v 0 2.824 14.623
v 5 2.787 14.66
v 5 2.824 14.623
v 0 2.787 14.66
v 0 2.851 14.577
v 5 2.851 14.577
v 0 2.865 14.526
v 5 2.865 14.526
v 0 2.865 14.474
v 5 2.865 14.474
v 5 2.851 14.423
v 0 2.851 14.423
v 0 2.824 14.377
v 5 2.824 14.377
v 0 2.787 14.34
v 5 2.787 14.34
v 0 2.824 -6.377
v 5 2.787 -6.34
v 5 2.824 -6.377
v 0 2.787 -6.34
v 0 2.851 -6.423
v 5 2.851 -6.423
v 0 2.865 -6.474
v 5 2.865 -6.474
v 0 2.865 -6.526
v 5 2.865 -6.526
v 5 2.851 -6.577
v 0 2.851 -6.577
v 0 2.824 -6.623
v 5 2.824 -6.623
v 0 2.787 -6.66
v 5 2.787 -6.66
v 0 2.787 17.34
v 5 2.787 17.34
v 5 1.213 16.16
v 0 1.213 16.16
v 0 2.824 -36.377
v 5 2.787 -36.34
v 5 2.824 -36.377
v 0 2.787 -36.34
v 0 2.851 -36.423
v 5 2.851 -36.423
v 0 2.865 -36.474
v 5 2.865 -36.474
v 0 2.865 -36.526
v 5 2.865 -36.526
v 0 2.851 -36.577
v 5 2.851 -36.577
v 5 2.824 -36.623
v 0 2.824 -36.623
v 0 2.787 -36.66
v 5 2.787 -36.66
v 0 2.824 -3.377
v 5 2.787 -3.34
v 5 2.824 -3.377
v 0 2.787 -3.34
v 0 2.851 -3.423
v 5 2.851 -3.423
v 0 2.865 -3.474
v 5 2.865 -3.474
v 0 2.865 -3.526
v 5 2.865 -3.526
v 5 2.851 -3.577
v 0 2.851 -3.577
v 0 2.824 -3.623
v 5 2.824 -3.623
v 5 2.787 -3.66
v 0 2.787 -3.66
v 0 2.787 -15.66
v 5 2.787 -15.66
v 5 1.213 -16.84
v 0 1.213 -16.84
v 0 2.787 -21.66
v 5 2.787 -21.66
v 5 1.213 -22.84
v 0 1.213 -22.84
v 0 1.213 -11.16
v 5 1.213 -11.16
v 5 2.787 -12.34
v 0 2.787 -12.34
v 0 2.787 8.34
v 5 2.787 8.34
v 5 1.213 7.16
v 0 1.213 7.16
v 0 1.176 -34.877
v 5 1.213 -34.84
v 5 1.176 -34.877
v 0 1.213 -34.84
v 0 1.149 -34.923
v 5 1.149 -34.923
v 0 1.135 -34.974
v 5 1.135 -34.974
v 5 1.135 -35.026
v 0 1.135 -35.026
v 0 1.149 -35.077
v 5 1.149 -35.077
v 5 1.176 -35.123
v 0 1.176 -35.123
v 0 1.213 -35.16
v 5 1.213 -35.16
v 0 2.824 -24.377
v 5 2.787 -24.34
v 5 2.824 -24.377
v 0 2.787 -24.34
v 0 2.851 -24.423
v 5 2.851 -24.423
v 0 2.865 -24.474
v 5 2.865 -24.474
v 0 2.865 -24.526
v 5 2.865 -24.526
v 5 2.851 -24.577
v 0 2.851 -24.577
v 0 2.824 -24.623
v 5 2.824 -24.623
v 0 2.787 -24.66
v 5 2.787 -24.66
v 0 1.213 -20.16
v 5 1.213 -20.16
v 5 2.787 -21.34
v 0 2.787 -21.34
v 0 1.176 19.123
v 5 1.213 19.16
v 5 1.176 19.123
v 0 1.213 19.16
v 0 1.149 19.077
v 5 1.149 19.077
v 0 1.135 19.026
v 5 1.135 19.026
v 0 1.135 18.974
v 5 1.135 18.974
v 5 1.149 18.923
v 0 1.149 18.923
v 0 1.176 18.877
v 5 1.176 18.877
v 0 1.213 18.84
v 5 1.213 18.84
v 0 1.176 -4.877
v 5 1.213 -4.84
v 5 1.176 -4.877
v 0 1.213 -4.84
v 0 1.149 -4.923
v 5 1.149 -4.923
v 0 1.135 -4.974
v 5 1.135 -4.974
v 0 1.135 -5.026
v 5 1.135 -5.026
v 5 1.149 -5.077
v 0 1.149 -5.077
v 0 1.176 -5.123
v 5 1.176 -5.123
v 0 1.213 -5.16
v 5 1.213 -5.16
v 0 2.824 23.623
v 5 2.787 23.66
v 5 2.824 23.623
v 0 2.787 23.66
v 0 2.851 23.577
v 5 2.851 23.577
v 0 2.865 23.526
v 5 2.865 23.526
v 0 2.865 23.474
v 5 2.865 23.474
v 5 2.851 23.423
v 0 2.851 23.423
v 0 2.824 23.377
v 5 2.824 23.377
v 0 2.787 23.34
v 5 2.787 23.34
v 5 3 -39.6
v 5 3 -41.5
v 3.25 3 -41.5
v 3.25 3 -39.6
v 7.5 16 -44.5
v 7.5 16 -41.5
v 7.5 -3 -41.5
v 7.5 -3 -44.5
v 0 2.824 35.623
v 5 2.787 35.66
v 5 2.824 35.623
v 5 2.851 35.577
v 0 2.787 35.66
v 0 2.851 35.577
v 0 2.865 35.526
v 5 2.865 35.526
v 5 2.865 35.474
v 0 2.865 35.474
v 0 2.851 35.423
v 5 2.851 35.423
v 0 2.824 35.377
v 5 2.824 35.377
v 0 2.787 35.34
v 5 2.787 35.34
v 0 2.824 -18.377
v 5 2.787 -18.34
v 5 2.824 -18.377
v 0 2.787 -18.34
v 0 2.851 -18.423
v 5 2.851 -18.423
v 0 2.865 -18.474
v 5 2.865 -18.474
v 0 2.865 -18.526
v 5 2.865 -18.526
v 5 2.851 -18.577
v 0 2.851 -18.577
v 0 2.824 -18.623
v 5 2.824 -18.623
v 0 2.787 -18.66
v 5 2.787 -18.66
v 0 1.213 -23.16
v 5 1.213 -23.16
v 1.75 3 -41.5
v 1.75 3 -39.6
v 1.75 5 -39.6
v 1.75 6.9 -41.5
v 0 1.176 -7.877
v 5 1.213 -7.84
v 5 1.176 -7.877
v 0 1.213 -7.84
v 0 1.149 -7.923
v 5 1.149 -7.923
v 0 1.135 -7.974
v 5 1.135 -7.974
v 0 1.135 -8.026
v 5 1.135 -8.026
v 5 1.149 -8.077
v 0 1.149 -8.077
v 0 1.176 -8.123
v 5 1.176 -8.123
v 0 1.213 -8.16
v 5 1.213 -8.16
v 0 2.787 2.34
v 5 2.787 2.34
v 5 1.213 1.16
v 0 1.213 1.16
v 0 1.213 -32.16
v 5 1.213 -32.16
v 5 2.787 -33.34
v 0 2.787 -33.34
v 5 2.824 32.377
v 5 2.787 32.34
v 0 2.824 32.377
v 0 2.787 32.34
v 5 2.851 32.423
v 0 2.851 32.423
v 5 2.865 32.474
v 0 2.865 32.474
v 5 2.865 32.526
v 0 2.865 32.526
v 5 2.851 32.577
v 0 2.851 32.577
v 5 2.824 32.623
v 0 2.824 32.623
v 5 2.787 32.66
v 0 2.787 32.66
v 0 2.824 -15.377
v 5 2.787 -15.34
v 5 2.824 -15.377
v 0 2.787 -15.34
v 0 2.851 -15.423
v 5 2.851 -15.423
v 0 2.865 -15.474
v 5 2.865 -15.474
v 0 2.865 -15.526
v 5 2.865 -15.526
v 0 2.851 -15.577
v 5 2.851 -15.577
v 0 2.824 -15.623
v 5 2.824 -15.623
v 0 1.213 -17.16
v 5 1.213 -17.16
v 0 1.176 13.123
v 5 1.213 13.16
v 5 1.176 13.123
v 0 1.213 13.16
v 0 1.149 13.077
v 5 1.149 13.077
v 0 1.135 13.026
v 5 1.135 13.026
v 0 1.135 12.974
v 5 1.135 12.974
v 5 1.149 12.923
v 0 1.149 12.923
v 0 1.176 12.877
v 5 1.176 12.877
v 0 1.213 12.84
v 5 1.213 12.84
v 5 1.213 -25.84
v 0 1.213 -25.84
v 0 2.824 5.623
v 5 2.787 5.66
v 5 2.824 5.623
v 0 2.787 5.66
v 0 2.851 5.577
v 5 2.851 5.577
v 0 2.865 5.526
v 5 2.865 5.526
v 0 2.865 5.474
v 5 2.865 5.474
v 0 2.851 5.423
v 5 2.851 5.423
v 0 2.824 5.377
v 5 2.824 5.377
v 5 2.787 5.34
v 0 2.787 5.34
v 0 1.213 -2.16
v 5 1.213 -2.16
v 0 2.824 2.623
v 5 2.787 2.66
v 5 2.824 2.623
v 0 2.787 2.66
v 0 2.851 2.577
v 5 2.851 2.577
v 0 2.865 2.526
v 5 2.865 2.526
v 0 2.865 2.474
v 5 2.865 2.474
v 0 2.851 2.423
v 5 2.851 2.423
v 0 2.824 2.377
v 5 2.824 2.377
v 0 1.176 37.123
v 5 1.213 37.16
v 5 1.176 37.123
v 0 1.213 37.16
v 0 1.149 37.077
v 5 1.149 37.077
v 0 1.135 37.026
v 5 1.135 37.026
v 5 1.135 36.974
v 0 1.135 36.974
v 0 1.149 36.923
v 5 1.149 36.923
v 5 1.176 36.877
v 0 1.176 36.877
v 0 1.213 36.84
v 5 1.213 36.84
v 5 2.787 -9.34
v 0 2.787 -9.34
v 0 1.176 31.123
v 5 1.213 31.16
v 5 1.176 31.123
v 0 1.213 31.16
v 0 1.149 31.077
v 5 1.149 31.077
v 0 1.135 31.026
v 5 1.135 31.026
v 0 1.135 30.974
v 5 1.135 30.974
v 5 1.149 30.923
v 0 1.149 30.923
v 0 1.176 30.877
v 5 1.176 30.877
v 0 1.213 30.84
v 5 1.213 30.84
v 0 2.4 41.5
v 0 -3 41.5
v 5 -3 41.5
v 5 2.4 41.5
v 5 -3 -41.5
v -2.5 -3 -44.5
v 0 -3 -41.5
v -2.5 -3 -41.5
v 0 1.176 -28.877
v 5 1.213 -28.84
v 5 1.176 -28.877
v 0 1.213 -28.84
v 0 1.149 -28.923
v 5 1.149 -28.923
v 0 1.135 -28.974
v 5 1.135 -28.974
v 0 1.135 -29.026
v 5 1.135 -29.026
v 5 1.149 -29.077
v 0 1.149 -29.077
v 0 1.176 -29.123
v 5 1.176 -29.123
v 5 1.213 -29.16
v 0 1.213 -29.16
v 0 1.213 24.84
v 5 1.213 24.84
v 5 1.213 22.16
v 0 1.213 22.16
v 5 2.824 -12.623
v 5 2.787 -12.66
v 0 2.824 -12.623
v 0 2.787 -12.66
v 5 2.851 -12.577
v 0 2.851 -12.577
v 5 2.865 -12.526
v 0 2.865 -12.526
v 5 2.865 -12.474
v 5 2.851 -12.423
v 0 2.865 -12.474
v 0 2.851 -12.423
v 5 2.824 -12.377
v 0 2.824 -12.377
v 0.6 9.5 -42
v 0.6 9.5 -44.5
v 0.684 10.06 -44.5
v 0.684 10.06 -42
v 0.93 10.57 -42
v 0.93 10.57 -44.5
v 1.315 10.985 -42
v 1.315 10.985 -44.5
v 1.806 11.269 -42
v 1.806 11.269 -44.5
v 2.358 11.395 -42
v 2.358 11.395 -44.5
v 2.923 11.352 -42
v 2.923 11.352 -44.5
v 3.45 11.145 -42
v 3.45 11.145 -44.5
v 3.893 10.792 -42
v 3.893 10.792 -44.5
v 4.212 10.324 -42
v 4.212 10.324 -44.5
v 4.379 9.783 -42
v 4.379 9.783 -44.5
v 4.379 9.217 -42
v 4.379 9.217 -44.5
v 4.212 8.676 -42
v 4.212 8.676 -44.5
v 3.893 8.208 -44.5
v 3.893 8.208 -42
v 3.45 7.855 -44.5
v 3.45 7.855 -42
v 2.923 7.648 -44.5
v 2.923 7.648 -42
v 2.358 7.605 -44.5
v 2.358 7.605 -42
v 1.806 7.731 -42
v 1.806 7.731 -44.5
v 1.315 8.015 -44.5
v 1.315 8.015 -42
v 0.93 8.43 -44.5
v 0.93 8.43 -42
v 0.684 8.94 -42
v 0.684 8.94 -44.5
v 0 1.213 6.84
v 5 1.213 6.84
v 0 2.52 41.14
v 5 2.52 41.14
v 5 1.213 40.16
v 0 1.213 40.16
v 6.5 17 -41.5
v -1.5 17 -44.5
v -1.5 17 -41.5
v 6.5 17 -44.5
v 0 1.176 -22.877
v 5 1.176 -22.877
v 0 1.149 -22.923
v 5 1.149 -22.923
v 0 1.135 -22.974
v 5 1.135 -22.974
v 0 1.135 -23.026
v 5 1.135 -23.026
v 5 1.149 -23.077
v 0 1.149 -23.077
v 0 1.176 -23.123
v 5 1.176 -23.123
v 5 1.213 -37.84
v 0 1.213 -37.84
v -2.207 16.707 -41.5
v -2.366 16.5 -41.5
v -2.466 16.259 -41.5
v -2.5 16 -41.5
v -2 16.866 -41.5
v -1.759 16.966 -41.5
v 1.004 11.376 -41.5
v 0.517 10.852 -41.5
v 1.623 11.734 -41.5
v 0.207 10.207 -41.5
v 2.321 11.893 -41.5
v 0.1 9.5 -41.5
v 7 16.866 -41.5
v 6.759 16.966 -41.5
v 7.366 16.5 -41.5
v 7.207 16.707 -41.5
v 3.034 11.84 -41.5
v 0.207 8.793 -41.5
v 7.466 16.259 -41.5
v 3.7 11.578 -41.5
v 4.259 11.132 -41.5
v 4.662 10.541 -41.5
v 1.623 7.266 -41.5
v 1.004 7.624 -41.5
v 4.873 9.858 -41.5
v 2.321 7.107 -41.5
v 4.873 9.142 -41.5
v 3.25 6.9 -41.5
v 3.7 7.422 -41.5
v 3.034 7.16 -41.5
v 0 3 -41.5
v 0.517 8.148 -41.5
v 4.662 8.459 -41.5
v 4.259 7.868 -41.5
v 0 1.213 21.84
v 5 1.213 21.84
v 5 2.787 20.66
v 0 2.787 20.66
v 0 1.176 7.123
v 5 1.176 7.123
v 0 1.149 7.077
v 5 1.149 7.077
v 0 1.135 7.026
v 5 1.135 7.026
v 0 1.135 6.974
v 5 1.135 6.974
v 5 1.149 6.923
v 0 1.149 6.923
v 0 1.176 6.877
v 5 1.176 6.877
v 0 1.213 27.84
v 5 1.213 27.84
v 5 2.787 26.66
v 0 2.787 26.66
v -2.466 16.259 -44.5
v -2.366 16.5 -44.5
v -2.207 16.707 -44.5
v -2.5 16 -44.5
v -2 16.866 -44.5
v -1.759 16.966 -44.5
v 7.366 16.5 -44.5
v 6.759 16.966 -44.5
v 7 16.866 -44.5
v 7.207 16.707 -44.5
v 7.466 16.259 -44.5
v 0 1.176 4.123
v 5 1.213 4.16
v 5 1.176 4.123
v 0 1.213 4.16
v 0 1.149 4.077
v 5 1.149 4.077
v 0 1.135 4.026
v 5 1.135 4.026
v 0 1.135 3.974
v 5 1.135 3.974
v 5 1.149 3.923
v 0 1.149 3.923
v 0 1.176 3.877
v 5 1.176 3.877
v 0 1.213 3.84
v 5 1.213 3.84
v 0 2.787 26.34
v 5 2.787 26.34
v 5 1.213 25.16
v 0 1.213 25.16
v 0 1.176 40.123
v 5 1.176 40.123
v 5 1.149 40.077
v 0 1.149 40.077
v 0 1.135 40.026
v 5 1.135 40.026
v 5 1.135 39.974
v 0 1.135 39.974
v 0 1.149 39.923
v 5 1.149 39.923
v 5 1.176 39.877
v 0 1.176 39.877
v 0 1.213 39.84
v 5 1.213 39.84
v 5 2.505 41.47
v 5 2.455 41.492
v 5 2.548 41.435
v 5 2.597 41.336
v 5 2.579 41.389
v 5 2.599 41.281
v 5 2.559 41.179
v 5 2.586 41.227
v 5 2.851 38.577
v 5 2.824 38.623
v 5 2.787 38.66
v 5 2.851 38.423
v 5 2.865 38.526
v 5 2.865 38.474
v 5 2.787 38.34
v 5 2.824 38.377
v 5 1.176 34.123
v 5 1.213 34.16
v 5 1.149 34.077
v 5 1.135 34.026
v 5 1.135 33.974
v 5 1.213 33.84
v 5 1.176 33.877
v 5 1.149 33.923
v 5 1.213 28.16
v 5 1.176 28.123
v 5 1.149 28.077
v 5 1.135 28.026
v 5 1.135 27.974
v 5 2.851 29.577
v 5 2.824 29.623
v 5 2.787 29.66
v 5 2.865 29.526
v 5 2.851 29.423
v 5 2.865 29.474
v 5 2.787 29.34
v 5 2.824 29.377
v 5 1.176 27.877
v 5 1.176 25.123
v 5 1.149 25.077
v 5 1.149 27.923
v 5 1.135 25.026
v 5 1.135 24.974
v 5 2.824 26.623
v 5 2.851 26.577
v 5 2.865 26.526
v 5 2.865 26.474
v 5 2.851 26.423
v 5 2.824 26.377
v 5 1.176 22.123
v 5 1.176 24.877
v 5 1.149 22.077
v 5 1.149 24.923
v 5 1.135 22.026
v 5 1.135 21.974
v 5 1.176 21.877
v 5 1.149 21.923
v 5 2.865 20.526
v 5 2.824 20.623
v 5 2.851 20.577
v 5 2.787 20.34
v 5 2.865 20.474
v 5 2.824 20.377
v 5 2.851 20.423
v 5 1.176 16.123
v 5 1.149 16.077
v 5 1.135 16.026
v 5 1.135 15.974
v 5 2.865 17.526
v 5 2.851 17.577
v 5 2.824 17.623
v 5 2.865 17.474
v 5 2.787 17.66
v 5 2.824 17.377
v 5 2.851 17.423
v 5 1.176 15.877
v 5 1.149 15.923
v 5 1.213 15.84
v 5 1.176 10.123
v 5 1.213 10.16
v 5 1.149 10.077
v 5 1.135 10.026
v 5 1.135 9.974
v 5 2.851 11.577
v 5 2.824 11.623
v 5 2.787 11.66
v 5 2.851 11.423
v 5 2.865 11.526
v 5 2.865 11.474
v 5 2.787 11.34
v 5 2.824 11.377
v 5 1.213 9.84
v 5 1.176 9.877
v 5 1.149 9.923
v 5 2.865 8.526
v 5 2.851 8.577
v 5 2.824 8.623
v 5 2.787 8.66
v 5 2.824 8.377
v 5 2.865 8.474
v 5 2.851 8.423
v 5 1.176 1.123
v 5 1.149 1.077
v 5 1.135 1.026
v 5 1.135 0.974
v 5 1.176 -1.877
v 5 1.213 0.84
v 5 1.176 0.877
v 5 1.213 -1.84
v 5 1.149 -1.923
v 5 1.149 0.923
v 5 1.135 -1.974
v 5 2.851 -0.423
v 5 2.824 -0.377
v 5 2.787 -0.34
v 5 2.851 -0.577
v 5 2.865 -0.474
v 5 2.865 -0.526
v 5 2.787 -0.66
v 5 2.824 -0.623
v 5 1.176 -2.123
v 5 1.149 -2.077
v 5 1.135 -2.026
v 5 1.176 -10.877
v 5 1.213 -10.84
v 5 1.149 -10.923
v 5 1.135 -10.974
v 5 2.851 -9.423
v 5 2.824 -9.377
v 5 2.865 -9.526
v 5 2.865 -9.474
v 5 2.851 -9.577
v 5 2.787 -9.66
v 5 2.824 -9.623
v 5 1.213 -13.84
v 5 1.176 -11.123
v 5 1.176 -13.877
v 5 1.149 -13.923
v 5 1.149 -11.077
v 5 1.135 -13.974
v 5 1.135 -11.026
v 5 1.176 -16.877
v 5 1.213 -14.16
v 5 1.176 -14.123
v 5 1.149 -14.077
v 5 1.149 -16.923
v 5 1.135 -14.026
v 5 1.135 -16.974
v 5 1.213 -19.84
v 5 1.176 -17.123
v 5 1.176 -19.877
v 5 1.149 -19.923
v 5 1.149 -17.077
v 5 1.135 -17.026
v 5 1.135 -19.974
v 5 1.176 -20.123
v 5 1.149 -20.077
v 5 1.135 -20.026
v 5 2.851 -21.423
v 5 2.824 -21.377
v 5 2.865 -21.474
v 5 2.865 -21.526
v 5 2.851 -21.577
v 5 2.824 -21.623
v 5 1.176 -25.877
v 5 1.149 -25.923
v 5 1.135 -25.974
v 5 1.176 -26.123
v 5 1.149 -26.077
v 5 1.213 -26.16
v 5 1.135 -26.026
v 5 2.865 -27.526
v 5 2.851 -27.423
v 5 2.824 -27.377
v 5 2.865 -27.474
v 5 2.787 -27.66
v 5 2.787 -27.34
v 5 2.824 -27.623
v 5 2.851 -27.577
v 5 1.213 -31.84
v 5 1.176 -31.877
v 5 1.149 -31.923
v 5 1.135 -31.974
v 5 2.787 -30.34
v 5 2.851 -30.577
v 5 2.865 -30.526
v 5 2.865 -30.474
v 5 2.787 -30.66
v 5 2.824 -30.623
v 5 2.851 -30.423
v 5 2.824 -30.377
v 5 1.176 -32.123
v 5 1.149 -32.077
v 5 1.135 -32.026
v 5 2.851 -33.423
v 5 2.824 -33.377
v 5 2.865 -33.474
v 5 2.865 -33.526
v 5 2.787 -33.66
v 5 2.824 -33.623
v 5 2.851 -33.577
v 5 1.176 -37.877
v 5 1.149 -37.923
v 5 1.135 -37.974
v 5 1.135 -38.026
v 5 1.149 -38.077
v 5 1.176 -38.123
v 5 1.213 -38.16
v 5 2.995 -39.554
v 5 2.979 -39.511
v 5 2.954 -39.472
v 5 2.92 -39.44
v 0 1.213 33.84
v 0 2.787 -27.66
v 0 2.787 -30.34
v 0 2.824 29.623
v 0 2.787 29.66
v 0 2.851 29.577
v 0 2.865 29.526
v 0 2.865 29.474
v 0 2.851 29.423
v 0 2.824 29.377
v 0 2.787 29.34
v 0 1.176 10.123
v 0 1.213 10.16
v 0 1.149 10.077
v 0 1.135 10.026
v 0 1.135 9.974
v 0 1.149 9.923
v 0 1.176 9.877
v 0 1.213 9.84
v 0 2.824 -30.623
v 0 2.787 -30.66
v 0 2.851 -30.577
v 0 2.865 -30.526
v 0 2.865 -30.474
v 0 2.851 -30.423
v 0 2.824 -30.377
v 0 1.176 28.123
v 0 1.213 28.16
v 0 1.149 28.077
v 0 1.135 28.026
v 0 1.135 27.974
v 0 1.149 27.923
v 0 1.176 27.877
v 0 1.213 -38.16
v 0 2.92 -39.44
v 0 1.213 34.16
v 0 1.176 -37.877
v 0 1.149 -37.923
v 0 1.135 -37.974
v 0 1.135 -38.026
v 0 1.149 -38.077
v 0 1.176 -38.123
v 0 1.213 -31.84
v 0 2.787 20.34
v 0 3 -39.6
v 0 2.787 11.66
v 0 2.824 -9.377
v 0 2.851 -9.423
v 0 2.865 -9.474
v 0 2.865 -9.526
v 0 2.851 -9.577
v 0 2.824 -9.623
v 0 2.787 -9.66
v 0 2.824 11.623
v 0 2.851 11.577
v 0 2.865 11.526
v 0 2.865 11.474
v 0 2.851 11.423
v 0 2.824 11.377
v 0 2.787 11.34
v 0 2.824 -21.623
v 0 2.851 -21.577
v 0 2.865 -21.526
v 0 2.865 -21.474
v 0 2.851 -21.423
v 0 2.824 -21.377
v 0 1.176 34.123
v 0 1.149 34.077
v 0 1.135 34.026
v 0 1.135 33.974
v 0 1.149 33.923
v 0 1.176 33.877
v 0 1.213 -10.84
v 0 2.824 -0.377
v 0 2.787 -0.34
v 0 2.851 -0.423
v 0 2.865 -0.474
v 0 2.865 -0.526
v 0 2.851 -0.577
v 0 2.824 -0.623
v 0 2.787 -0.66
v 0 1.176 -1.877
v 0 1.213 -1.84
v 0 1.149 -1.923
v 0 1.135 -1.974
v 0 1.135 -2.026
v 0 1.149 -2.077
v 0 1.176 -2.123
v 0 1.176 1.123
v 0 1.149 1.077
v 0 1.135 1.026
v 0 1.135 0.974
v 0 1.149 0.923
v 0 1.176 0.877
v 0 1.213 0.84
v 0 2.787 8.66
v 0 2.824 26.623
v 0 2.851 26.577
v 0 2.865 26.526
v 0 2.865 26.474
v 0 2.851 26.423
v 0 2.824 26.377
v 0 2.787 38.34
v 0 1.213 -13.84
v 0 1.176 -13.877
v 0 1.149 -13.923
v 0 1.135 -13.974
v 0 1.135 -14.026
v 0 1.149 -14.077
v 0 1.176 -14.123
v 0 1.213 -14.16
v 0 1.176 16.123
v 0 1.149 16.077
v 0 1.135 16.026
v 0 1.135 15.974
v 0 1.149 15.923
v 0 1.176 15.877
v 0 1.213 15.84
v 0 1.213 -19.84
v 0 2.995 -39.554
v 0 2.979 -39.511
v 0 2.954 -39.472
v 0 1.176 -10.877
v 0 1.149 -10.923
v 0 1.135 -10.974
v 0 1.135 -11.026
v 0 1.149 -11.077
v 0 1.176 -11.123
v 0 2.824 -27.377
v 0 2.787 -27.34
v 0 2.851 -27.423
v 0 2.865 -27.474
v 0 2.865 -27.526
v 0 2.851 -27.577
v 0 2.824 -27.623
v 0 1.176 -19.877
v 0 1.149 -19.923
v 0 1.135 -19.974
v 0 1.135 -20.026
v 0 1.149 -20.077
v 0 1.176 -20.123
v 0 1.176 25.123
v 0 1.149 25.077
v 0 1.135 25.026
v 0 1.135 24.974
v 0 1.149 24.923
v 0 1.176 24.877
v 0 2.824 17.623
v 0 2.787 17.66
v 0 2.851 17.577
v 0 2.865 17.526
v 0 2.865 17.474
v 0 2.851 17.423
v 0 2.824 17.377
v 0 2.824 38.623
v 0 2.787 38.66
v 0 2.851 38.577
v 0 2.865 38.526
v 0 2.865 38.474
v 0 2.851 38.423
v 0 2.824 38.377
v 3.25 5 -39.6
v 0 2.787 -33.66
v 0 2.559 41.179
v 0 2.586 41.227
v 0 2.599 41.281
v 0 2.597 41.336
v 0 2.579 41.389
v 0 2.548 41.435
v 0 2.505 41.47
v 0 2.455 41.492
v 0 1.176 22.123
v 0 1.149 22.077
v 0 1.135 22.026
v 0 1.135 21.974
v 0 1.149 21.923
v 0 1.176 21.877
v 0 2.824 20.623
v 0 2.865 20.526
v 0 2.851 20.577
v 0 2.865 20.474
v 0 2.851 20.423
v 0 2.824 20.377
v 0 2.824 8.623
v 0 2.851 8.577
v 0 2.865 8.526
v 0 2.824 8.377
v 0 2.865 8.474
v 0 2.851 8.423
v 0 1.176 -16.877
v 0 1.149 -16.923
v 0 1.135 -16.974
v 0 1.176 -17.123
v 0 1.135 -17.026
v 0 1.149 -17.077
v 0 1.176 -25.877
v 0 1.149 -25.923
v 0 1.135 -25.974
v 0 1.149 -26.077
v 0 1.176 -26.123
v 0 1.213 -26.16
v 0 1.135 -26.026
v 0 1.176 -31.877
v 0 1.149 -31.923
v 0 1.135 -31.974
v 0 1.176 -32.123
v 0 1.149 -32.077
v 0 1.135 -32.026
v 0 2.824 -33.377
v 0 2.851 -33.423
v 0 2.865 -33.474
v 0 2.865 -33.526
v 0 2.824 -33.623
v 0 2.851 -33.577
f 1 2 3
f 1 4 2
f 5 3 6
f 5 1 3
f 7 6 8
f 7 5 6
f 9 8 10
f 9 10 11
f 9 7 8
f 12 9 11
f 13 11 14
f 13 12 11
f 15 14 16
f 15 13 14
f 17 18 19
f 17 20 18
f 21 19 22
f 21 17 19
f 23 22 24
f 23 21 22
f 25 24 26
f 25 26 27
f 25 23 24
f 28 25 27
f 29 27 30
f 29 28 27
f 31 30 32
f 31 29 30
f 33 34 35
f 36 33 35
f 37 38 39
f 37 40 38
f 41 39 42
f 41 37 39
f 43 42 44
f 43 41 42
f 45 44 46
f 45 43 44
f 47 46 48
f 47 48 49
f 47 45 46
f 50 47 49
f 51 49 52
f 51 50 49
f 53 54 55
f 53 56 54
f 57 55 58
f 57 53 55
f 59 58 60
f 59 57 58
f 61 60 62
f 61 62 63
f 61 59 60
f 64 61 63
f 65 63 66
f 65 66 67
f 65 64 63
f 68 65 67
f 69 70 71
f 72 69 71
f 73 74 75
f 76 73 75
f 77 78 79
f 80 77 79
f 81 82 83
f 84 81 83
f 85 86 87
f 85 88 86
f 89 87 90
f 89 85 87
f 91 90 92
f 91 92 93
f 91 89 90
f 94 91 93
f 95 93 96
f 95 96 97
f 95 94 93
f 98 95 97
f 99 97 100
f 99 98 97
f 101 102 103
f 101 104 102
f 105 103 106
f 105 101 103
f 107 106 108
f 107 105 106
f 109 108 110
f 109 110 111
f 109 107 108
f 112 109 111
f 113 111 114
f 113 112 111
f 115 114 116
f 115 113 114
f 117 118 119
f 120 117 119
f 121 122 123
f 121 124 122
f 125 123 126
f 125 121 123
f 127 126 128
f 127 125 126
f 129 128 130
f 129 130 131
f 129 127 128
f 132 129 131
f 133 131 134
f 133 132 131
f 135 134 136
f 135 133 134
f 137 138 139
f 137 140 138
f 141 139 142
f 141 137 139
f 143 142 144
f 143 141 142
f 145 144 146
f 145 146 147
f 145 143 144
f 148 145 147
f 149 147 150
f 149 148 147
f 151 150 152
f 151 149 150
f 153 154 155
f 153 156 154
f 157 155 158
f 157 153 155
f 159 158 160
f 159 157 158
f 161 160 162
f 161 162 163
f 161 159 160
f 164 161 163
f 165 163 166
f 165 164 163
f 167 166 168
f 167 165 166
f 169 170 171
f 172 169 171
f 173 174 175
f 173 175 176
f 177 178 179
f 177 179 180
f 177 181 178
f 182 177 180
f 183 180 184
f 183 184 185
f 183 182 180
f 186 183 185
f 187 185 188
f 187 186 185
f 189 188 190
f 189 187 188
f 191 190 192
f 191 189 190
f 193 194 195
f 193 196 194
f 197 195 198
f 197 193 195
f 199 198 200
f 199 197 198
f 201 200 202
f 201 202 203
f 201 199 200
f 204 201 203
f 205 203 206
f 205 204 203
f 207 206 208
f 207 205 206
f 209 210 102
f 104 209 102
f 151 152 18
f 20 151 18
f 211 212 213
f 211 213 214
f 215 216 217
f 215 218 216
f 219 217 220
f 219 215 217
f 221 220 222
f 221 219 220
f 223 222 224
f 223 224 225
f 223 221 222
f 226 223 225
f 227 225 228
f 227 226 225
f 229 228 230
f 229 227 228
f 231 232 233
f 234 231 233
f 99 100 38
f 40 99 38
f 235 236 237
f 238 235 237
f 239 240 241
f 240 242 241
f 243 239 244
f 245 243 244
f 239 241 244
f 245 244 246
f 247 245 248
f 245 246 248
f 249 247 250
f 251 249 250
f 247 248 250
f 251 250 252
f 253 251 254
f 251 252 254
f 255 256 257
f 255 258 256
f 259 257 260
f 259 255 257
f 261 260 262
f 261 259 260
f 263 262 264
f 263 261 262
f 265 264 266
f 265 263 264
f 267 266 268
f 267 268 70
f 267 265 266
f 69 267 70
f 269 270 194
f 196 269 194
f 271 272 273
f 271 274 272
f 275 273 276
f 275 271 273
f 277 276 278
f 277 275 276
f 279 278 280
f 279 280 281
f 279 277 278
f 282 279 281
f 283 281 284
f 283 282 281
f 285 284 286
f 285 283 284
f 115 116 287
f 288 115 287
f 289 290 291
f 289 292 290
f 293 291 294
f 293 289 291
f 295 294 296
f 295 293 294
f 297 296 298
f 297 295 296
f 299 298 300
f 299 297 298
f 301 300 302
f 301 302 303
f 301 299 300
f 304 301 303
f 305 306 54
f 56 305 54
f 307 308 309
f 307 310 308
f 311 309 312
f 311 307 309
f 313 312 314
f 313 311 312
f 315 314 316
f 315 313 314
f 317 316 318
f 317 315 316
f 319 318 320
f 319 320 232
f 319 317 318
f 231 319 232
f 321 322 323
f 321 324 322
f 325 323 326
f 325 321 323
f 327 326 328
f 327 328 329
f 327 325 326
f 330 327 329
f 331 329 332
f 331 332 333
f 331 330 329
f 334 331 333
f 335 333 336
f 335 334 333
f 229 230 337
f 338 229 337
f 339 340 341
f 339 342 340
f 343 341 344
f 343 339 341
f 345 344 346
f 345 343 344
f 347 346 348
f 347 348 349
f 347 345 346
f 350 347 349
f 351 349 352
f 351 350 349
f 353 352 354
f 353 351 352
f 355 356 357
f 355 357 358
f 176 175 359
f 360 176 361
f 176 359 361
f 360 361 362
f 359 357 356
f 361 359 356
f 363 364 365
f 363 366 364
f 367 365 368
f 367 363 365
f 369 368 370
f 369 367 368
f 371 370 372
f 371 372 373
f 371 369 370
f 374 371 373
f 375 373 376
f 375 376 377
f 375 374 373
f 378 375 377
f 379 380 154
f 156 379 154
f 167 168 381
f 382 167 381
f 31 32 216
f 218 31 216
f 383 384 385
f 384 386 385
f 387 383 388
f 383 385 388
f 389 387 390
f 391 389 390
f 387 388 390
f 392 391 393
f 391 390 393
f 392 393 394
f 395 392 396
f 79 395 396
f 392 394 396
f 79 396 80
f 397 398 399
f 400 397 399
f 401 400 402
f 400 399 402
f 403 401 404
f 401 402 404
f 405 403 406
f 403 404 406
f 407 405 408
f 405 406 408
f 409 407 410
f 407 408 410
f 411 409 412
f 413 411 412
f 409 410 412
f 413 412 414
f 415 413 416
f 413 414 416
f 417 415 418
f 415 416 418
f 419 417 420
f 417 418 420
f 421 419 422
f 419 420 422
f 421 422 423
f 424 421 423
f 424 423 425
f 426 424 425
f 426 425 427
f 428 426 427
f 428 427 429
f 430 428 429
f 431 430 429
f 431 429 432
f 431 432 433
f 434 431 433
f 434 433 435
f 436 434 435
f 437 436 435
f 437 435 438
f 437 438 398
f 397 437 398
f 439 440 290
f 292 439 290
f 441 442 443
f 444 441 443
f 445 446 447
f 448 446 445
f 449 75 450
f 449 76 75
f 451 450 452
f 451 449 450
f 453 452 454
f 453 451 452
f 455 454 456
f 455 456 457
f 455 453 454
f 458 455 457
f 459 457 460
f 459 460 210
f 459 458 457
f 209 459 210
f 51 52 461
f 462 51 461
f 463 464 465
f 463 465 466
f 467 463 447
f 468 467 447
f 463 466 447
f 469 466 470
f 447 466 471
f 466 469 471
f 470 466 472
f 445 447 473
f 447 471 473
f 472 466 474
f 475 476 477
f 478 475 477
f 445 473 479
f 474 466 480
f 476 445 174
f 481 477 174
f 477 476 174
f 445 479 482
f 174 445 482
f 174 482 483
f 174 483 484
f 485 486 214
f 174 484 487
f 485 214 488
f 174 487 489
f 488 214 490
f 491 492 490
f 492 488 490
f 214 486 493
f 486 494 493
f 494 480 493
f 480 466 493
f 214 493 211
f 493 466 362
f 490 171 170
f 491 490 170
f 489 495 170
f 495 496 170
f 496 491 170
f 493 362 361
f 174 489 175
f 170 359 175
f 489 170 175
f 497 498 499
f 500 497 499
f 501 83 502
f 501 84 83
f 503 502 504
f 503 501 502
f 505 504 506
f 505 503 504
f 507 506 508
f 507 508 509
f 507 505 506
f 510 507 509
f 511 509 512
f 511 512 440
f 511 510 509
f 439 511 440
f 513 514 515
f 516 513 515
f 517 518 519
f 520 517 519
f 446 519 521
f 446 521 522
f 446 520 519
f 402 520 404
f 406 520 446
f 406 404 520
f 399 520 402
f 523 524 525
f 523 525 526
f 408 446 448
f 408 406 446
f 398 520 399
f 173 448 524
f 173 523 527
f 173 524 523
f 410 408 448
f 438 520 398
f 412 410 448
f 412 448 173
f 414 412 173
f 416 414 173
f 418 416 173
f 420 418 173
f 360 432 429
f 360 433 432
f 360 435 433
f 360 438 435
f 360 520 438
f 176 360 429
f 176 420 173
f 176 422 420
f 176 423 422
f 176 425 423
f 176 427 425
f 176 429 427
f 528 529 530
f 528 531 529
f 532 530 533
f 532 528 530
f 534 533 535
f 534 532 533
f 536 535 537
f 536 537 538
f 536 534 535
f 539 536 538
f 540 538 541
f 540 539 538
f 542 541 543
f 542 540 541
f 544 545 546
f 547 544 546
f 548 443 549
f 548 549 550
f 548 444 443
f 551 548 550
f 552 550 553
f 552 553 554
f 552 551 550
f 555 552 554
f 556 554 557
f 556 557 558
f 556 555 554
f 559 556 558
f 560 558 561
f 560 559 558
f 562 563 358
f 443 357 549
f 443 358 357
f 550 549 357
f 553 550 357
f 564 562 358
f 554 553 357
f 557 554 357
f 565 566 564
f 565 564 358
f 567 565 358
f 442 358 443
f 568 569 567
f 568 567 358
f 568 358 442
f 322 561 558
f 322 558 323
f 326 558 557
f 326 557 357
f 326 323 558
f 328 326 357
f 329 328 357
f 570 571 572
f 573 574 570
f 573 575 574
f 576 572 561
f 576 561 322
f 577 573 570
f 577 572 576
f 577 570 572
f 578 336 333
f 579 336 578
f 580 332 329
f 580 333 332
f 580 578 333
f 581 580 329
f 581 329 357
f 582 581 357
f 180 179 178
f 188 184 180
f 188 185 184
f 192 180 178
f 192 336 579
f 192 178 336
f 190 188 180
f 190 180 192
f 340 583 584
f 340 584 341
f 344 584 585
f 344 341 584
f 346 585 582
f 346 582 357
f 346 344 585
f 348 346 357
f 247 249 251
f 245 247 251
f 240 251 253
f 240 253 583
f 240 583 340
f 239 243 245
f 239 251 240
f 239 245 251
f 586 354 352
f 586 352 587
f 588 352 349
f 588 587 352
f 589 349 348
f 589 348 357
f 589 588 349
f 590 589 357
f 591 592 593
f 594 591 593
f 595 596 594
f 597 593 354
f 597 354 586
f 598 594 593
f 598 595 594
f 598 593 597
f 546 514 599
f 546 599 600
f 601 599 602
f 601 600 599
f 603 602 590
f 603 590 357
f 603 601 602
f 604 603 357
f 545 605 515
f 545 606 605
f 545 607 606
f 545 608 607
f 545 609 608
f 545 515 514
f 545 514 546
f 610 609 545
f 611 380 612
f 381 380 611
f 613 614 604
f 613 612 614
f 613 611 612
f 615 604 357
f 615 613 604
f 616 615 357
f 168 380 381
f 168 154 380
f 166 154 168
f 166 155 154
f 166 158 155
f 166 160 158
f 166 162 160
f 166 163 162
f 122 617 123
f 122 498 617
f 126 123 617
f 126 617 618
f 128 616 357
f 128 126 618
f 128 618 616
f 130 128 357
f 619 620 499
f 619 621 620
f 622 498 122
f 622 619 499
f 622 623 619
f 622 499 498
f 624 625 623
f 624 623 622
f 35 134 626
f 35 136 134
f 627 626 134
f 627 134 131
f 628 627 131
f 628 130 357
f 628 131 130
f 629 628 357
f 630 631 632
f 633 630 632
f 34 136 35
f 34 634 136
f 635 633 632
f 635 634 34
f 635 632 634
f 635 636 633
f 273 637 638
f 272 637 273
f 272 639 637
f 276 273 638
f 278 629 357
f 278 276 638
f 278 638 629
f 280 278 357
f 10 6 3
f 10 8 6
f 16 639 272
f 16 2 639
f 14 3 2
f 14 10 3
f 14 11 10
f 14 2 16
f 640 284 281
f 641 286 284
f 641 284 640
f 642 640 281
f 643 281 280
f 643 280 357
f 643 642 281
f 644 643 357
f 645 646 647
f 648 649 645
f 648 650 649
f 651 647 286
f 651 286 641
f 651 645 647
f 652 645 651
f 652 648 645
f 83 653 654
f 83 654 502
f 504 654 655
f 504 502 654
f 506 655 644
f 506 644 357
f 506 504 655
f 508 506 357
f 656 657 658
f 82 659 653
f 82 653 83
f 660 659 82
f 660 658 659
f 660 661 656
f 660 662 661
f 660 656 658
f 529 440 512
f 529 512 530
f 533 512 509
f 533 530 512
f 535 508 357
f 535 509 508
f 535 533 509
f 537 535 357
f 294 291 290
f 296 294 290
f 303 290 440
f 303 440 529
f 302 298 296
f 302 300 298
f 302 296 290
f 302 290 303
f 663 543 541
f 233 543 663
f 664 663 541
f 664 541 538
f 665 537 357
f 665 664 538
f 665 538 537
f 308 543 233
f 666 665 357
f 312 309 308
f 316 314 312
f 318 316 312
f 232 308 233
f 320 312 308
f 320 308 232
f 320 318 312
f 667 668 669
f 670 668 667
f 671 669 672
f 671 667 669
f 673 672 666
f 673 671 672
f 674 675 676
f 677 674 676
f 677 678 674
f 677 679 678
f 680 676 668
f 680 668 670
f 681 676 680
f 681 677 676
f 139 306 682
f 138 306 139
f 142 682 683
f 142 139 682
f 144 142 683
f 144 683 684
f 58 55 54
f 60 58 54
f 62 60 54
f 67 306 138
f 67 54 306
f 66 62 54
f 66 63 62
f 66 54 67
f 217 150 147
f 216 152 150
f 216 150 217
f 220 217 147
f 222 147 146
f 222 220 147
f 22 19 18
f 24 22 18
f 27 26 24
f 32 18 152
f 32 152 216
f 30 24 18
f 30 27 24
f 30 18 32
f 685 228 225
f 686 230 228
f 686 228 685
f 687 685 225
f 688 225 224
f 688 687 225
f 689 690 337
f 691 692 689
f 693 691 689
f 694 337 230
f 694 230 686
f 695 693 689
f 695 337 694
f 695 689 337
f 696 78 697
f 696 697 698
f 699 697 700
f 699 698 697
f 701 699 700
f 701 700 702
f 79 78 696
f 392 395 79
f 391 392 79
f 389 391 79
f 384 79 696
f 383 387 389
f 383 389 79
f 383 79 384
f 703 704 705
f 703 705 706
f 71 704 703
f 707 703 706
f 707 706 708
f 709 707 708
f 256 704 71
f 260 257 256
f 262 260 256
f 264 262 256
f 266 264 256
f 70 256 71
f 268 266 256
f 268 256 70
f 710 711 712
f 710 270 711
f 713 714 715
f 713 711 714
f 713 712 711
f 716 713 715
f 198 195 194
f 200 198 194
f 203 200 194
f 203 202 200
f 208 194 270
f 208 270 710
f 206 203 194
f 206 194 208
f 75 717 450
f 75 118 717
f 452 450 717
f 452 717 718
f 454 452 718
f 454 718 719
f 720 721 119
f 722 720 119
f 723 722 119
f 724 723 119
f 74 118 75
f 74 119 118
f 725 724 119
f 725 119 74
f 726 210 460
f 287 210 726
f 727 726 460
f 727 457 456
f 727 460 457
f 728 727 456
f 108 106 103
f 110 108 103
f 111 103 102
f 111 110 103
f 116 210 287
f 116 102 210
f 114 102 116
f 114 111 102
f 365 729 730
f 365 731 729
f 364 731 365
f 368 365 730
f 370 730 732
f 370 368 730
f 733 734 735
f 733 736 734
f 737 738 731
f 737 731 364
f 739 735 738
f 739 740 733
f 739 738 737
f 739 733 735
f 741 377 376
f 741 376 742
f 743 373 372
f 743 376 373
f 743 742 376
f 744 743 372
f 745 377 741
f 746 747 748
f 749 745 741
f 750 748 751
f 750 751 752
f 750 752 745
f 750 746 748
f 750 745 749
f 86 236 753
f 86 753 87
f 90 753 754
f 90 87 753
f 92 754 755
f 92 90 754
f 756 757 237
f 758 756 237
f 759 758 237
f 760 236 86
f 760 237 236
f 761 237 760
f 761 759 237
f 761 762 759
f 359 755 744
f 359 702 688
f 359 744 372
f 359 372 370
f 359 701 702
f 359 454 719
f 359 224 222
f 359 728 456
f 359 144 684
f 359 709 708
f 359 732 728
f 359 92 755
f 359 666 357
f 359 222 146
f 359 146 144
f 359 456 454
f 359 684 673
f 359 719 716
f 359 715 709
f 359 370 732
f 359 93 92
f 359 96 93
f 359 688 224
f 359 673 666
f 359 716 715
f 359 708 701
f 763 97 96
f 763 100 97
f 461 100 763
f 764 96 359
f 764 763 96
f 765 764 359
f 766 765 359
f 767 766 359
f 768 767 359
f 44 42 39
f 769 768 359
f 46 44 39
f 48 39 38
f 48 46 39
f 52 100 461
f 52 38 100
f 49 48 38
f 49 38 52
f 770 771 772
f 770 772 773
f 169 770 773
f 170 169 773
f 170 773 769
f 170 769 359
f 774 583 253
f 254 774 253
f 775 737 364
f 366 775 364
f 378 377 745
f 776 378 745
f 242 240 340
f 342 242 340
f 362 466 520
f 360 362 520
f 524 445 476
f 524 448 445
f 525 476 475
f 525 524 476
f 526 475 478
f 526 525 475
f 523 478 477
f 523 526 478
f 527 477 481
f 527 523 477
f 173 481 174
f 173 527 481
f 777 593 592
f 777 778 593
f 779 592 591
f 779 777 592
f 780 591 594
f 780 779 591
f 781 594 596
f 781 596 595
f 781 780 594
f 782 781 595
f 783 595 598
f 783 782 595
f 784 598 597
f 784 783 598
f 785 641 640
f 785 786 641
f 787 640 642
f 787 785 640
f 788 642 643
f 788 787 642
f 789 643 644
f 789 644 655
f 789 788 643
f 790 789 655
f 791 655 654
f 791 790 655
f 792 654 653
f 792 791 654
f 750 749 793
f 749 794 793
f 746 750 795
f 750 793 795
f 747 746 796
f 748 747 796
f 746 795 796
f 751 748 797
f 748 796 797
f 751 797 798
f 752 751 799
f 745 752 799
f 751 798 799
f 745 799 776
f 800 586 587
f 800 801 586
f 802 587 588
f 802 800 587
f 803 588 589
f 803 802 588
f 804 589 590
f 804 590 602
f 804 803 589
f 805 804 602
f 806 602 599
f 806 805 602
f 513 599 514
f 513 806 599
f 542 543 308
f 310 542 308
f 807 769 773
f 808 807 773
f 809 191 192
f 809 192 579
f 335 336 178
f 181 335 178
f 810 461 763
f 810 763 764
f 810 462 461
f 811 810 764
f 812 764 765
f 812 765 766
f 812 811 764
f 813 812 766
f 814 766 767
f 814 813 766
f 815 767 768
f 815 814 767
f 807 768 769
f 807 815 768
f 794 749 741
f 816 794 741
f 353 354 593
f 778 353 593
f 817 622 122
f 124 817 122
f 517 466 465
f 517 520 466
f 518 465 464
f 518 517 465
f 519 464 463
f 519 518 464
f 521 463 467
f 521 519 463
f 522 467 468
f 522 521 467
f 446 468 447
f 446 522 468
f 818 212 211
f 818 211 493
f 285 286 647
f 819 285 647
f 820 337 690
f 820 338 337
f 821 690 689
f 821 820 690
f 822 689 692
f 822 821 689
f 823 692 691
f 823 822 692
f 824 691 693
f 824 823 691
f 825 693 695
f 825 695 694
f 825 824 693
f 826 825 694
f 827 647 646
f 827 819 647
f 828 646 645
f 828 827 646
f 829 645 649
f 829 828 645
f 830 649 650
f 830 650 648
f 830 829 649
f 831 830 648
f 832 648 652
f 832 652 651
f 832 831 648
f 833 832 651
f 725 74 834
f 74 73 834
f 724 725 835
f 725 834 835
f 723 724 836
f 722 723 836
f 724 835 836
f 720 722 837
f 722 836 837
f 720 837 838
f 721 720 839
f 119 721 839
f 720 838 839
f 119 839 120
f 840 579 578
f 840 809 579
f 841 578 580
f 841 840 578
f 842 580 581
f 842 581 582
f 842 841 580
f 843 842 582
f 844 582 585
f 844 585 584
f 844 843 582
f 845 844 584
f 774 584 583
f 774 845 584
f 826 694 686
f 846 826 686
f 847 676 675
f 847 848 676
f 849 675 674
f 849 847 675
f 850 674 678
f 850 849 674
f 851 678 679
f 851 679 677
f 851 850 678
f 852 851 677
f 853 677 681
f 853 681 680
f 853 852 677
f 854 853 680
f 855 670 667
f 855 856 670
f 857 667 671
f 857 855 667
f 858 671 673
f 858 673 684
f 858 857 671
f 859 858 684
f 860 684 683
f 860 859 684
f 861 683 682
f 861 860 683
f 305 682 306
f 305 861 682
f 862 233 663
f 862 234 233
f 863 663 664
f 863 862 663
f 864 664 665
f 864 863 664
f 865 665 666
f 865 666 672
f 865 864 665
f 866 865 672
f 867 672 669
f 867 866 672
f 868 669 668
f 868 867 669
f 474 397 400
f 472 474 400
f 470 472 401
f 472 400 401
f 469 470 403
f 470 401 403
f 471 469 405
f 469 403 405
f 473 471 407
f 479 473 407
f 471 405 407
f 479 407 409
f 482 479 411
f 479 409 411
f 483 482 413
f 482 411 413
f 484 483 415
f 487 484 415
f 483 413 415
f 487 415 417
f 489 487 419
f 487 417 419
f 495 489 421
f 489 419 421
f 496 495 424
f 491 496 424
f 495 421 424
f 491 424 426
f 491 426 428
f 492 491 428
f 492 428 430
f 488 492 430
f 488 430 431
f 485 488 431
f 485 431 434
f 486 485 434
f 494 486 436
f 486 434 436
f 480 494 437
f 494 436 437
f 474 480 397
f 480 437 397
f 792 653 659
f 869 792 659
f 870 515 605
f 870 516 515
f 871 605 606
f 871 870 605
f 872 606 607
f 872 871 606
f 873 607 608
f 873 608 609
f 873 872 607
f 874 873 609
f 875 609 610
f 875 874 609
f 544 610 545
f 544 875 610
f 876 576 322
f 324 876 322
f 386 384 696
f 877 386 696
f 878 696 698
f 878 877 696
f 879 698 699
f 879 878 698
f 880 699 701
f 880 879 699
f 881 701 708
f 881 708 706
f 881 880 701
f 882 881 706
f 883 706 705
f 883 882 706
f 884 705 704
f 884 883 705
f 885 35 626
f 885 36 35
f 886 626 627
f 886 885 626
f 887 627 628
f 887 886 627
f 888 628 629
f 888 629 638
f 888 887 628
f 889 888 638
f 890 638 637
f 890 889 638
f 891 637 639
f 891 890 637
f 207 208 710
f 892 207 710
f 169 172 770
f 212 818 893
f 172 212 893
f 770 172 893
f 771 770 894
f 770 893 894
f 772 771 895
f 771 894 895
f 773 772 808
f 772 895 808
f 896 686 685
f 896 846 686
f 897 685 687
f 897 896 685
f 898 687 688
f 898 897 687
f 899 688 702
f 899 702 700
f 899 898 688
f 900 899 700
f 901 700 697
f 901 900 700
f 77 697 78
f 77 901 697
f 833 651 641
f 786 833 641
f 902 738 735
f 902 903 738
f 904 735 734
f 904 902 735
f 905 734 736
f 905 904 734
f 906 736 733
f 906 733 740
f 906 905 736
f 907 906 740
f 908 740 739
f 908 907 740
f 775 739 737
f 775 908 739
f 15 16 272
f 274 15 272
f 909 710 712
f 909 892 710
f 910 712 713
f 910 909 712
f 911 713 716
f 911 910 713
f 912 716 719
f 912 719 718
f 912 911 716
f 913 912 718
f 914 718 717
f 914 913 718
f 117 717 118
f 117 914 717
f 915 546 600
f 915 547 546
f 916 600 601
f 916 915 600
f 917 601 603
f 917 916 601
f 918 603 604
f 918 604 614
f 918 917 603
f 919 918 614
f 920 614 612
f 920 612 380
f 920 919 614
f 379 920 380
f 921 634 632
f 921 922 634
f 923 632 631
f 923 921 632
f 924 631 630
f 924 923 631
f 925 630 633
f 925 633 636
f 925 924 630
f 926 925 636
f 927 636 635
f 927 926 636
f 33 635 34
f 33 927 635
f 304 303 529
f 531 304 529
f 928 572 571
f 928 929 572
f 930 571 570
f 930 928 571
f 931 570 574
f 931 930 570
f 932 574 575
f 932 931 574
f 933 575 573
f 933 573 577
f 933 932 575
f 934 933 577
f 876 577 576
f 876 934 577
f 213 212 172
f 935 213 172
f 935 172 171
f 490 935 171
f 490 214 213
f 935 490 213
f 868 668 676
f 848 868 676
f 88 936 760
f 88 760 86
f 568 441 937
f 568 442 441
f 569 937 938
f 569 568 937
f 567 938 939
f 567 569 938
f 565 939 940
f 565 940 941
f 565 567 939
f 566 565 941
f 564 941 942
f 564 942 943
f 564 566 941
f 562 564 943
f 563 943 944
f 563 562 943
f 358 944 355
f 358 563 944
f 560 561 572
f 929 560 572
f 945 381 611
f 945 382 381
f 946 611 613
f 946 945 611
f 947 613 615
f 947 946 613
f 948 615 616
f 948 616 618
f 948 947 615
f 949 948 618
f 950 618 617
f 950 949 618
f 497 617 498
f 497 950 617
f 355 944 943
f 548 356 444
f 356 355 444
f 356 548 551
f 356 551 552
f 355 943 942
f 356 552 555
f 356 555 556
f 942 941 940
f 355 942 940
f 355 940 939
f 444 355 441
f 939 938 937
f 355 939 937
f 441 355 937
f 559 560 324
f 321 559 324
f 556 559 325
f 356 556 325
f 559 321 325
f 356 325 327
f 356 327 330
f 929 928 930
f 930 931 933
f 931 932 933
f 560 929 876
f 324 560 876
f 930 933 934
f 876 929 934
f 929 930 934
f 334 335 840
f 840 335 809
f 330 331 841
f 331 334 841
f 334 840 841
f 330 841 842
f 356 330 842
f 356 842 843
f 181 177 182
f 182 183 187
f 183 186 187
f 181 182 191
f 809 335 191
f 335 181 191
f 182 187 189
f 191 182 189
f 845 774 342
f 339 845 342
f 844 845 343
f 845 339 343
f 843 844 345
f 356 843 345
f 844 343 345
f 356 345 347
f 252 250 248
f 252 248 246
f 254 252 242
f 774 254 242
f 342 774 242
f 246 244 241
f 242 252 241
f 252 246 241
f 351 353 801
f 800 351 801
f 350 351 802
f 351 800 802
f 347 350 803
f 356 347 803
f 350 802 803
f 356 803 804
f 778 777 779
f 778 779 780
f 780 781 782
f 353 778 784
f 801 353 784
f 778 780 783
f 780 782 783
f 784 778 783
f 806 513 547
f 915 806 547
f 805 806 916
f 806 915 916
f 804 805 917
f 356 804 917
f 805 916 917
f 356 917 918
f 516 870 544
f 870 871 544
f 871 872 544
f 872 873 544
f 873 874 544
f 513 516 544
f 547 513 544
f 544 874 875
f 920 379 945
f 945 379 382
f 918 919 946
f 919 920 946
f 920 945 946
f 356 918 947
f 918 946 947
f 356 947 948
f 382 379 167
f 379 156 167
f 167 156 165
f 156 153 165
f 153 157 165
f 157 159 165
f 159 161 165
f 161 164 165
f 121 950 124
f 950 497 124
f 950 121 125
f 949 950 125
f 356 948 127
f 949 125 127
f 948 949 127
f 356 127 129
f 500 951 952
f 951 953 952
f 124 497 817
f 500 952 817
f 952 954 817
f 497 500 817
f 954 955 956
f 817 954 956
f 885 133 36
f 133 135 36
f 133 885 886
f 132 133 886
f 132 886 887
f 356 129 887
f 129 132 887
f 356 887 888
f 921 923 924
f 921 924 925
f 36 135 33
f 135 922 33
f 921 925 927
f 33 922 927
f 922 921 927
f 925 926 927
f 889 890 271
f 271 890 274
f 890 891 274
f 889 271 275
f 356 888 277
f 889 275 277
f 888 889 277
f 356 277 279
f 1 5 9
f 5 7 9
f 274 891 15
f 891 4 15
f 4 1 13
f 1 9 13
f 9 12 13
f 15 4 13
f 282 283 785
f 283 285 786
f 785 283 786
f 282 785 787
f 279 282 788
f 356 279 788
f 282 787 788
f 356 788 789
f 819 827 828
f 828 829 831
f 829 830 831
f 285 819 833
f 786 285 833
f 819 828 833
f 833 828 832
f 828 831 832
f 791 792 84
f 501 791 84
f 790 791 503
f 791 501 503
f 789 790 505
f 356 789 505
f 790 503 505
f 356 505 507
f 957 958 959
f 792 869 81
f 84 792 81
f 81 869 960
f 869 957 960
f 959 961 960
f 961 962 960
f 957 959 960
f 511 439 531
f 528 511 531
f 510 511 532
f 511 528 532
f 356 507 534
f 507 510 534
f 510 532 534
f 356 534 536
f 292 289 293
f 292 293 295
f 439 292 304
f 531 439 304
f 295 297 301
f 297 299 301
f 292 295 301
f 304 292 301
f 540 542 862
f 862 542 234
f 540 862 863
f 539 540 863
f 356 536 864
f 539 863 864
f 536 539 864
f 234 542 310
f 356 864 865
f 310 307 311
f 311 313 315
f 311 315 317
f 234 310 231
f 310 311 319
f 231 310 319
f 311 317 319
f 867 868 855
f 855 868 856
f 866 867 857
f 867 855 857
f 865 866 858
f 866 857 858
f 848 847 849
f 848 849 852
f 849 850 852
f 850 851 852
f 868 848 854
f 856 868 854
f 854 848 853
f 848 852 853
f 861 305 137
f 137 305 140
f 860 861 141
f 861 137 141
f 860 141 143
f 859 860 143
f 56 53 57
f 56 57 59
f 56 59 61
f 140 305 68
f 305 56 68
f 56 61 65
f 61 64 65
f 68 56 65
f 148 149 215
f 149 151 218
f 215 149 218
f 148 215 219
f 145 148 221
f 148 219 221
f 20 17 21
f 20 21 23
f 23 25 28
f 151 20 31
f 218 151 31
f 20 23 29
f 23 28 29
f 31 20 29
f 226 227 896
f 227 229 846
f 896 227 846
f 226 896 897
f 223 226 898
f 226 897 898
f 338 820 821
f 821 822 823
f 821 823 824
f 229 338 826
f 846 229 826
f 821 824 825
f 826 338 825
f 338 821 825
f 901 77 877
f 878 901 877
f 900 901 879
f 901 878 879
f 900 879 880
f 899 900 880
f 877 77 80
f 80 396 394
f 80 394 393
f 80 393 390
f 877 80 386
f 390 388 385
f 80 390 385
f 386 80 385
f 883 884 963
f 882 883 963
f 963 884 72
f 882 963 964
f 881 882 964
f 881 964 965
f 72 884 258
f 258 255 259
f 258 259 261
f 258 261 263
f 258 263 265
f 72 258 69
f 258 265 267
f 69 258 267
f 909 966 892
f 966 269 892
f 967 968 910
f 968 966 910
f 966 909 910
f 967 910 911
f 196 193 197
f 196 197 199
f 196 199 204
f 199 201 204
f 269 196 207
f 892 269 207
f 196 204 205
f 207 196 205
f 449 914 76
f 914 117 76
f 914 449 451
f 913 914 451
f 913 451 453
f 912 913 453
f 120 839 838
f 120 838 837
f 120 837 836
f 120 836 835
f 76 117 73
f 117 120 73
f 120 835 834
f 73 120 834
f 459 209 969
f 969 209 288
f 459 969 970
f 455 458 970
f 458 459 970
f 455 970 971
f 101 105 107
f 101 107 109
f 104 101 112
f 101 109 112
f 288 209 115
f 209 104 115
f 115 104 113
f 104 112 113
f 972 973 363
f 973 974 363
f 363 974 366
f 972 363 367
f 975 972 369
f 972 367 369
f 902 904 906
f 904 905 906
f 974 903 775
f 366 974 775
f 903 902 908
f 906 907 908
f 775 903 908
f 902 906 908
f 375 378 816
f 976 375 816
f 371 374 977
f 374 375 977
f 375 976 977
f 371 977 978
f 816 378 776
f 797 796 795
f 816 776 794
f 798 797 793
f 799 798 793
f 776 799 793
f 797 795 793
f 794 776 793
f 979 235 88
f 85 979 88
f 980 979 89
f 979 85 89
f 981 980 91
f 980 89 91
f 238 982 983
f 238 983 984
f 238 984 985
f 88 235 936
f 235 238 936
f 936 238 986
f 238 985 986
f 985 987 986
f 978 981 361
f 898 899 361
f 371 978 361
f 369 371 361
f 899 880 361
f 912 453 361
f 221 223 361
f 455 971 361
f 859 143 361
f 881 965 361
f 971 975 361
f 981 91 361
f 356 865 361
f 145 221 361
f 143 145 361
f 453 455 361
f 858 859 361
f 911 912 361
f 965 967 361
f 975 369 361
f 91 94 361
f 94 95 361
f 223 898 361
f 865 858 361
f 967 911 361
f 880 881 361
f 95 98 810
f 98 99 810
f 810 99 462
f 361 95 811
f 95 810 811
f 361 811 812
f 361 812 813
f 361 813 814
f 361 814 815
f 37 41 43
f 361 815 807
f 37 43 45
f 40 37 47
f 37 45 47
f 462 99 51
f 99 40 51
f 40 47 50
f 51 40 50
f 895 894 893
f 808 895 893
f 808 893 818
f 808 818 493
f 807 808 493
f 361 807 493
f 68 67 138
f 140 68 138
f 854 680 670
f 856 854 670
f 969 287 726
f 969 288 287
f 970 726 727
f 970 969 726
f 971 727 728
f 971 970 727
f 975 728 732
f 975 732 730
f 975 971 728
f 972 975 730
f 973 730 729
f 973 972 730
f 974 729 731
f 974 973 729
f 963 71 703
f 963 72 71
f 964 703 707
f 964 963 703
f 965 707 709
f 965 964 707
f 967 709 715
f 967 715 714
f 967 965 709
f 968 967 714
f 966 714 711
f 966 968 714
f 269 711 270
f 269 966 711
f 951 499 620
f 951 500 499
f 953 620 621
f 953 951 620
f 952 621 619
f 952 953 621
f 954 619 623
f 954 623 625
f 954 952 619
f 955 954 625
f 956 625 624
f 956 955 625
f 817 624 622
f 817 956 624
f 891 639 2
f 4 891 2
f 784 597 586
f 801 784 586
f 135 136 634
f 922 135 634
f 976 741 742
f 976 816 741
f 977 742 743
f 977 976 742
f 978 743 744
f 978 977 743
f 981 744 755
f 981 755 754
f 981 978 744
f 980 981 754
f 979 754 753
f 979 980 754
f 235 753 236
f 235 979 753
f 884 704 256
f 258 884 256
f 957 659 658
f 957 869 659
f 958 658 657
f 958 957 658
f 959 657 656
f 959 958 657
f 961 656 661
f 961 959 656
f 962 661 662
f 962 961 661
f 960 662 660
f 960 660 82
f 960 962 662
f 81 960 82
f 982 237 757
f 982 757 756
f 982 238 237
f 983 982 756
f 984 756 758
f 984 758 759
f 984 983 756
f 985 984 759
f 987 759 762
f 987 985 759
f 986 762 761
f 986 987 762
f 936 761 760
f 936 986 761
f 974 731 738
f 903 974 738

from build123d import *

# Parameters (mm, degrees)
ESQUISSE1_W                      = 83
ESQUISSE1_H                      = 6
BOSS_EXTRU_1_DEPTH               = 5
ENL_V_MAT_EXTRU_1_DEPTH          = 5
CONG_1_R                         = 0.2
R_P_TITION_LIN_AIRE4_COUNT       = 9
R_P_TITION_LIN_AIRE4_PITCH       = 9
CONG_1_OF_R_P_TITION_LIN_AIRE4_R = 0.2
CONG_2_R                         = 0.2
ESQUISSE3_W                      = 10
ESQUISSE3_H                      = 6
BOSS_EXTRU_2_DEPTH               = 3
ESQUISSE4_W                      = 10
ESQUISSE4_H                      = 3
BOSS_EXTRU_3_DEPTH               = 14
ESQUISSE5_R                      = 1.9
ENL_V_MAT_EXTRU_2_DEPTH          = 15
CONG_3_R                         = 1
CHANFREIN1_SIZE                  = 0.5
ESQUISSE6_W                      = 1.5
ESQUISSE6_H                      = 1.9
BOSS_EXTRU_4_DEPTH               = 4
CHANFREIN2_SIZE                  = 2


with BuildPart() as part:
    # Esquisse1 → Boss.-Extru.1 (new body)
    with BuildSketch(Plane(origin=(0, 0, 0), x_dir=(0, 0, -1), z_dir=(1, 0, 0))):
        Rectangle(ESQUISSE1_W, ESQUISSE1_H)
    extrude(amount=BOSS_EXTRU_1_DEPTH)

    # Esquisse2 → Enlèv. mat.-Extru.1 (cut)
    with BuildSketch(Plane(origin=(5, 0, 0), x_dir=(0, 0, -1), z_dir=(1, 0, 0))):
        Polygon((-38.5, 3), (-41.5, 3), (-40, 1), align=None)
        Polygon((-35.5, 3), (-38.5, 3), (-37, 1), align=None)
        Polygon((-32.5, 3), (-35.5, 3), (-34, 1), align=None)
    enl_v_mat_extru_1 = extrude(amount=-ENL_V_MAT_EXTRU_1_DEPTH, mode=Mode.SUBTRACT)

    # Congé1
    cong_1_edges = [part.edges().sort_by_distance(p)[0] for p in [
        (2.5, 1, 40),
        (2.5, 3, 38.5),
        (2.5, 1, 34),
        (2.5, 1, 37),
        (2.5, 3, 35.5),
    ]]
    fillet(cong_1_edges, radius=CONG_1_R)

    # Répétition linéaire4: Enlèv. mat.-Extru.1 ×9
    with Locations(*[(0, 0, -i * R_P_TITION_LIN_AIRE4_PITCH) for i in range(1, R_P_TITION_LIN_AIRE4_COUNT)]):
        add(enl_v_mat_extru_1, mode=Mode.SUBTRACT)

    # Congé1 of Répétition linéaire4
    cong_1_of_r_p_tition_lin_aire4_edges = [part.edges().sort_by_distance(p)[0] for p in [
        (2.5, 1, 31),
        (2.5, 3, 29.5),
        (2.5, 1, 25),
        (2.5, 1, 28),
        (2.5, 3, 26.5),
        (2.5, 1, 22),
        (2.5, 3, 20.5),
        (2.5, 1, 16),
        (2.5, 1, 19),
        (2.5, 3, 17.5),
        (2.5, 1, 13),
        (2.5, 3, 11.5),
        (2.5, 1, 7),
        (2.5, 1, 10),
        (2.5, 3, 8.5),
        (2.5, 1, 4),
        (2.5, 3, 2.5),
        (2.5, 1, -2),
        (2.5, 1, 1),
        (2.5, 3, -0.5),
        (2.5, 1, -5),
        (2.5, 3, -6.5),
        (2.5, 1, -11),
        (2.5, 1, -8),
        (2.5, 3, -9.5),
        (2.5, 1, -14),
        (2.5, 3, -15.5),
        (2.5, 1, -20),
        (2.5, 1, -17),
        (2.5, 3, -18.5),
        (2.5, 1, -23),
        (2.5, 3, -24.5),
        (2.5, 1, -29),
        (2.5, 1, -26),
        (2.5, 3, -27.5),
        (2.5, 1, -32),
        (2.5, 3, -33.5),
        (2.5, 1, -38),
        (2.5, 1, -35),
        (2.5, 3, -36.5),
    ]]
    fillet(cong_1_of_r_p_tition_lin_aire4_edges, radius=CONG_1_OF_R_P_TITION_LIN_AIRE4_R)

    # Congé2
    cong_2_edges = [part.edges().sort_by_distance(p)[0] for p in [
        (2.5, 3, 23.5),
        (2.5, 3, 5.5),
        (2.5, 3, -12.5),
        (2.5, 3, -30.5),
        (2.5, 3, 14.5),
        (2.5, 3, -3.5),
        (2.5, 3, 32.5),
        (2.5, 3, -21.5),
        (2.5, 3, -39.5),
        (2.5, 3, 41.5),
    ]]
    fillet(cong_2_edges, radius=CONG_2_R)

    # Esquisse3 → Boss.-Extru.2 (add)
    with BuildSketch(Plane(origin=(0, 0, -41.5), x_dir=(-1, 0, 0), z_dir=(0, 0, -1))):
        with Locations((-2.5, 0)):
            Rectangle(ESQUISSE3_W, ESQUISSE3_H)
    extrude(amount=BOSS_EXTRU_2_DEPTH)

    # Esquisse4 → Boss.-Extru.3 (add)
    with BuildSketch(Plane(origin=(0, 3, 0), x_dir=(1, 0, 0), z_dir=(0, 1, 0))):
        with Locations((2.5, 43)):
            Rectangle(ESQUISSE4_W, ESQUISSE4_H)
    extrude(amount=BOSS_EXTRU_3_DEPTH)

    # Esquisse5 → Enlèv. mat.-Extru.2 (cut)
    with BuildSketch(Plane(origin=(0, 0, -44.5), x_dir=(-1, 0, 0), z_dir=(0, 0, -1))):
        with Locations((-2.5, 9.5)):
            Circle(ESQUISSE5_R)
    extrude(amount=-ENL_V_MAT_EXTRU_2_DEPTH, mode=Mode.SUBTRACT)

    # Congé3
    cong_3_edges = [part.edges().sort_by_distance(p)[0] for p in [
        (-2.5, 17, -43),
        (7.5, 17, -43),
    ]]
    fillet(cong_3_edges, radius=CONG_3_R)

    # Chanfrein1
    chanfrein1_edges = [part.edges().sort_by_distance(p)[0] for p in [
        (4.4, 9.5, -41.5),
    ]]
    chamfer(chanfrein1_edges, length=CHANFREIN1_SIZE)

    # Esquisse6 → Boss.-Extru.4 (add)
    with BuildSketch(Plane(origin=(0, 3, 0), x_dir=(1, 0, 0), z_dir=(0, 1, 0))):
        with Locations((2.5, 40.55)):
            Rectangle(ESQUISSE6_W, ESQUISSE6_H)
    extrude(amount=BOSS_EXTRU_4_DEPTH)

    # Chanfrein2
    # the kernel refuses this chamfer: 2 mm, written as the material it takes off along each edge
    with BuildSketch(Plane(origin=(-3.393365976, 7, -39.6), x_dir=(0, 0.02749587661058651, -0.9996219169112968), z_dir=(1, 0, 0))) as chanfrein2_piece_1_section:
        Polygon((CHANFREIN2_SIZE * 0.999621916911, -CHANFREIN2_SIZE * 0.0274958766106), (-CHANFREIN2_SIZE * 0.0274958766106, -CHANFREIN2_SIZE * 0.999621916911), (0, 0), align=None)
    chanfrein2_piece_1 = extrude(amount=11.786731952, mode=Mode.PRIVATE)
    chanfrein2_piece_1 = split(chanfrein2_piece_1, bisect_by=Plane(origin=(2.5, 6.33491081, -41.5), z_dir=(0, 0, 1)), keep=Keep.TOP, mode=Mode.PRIVATE)
    add(chanfrein2_piece_1, mode=Mode.SUBTRACT)


solid = part.part
